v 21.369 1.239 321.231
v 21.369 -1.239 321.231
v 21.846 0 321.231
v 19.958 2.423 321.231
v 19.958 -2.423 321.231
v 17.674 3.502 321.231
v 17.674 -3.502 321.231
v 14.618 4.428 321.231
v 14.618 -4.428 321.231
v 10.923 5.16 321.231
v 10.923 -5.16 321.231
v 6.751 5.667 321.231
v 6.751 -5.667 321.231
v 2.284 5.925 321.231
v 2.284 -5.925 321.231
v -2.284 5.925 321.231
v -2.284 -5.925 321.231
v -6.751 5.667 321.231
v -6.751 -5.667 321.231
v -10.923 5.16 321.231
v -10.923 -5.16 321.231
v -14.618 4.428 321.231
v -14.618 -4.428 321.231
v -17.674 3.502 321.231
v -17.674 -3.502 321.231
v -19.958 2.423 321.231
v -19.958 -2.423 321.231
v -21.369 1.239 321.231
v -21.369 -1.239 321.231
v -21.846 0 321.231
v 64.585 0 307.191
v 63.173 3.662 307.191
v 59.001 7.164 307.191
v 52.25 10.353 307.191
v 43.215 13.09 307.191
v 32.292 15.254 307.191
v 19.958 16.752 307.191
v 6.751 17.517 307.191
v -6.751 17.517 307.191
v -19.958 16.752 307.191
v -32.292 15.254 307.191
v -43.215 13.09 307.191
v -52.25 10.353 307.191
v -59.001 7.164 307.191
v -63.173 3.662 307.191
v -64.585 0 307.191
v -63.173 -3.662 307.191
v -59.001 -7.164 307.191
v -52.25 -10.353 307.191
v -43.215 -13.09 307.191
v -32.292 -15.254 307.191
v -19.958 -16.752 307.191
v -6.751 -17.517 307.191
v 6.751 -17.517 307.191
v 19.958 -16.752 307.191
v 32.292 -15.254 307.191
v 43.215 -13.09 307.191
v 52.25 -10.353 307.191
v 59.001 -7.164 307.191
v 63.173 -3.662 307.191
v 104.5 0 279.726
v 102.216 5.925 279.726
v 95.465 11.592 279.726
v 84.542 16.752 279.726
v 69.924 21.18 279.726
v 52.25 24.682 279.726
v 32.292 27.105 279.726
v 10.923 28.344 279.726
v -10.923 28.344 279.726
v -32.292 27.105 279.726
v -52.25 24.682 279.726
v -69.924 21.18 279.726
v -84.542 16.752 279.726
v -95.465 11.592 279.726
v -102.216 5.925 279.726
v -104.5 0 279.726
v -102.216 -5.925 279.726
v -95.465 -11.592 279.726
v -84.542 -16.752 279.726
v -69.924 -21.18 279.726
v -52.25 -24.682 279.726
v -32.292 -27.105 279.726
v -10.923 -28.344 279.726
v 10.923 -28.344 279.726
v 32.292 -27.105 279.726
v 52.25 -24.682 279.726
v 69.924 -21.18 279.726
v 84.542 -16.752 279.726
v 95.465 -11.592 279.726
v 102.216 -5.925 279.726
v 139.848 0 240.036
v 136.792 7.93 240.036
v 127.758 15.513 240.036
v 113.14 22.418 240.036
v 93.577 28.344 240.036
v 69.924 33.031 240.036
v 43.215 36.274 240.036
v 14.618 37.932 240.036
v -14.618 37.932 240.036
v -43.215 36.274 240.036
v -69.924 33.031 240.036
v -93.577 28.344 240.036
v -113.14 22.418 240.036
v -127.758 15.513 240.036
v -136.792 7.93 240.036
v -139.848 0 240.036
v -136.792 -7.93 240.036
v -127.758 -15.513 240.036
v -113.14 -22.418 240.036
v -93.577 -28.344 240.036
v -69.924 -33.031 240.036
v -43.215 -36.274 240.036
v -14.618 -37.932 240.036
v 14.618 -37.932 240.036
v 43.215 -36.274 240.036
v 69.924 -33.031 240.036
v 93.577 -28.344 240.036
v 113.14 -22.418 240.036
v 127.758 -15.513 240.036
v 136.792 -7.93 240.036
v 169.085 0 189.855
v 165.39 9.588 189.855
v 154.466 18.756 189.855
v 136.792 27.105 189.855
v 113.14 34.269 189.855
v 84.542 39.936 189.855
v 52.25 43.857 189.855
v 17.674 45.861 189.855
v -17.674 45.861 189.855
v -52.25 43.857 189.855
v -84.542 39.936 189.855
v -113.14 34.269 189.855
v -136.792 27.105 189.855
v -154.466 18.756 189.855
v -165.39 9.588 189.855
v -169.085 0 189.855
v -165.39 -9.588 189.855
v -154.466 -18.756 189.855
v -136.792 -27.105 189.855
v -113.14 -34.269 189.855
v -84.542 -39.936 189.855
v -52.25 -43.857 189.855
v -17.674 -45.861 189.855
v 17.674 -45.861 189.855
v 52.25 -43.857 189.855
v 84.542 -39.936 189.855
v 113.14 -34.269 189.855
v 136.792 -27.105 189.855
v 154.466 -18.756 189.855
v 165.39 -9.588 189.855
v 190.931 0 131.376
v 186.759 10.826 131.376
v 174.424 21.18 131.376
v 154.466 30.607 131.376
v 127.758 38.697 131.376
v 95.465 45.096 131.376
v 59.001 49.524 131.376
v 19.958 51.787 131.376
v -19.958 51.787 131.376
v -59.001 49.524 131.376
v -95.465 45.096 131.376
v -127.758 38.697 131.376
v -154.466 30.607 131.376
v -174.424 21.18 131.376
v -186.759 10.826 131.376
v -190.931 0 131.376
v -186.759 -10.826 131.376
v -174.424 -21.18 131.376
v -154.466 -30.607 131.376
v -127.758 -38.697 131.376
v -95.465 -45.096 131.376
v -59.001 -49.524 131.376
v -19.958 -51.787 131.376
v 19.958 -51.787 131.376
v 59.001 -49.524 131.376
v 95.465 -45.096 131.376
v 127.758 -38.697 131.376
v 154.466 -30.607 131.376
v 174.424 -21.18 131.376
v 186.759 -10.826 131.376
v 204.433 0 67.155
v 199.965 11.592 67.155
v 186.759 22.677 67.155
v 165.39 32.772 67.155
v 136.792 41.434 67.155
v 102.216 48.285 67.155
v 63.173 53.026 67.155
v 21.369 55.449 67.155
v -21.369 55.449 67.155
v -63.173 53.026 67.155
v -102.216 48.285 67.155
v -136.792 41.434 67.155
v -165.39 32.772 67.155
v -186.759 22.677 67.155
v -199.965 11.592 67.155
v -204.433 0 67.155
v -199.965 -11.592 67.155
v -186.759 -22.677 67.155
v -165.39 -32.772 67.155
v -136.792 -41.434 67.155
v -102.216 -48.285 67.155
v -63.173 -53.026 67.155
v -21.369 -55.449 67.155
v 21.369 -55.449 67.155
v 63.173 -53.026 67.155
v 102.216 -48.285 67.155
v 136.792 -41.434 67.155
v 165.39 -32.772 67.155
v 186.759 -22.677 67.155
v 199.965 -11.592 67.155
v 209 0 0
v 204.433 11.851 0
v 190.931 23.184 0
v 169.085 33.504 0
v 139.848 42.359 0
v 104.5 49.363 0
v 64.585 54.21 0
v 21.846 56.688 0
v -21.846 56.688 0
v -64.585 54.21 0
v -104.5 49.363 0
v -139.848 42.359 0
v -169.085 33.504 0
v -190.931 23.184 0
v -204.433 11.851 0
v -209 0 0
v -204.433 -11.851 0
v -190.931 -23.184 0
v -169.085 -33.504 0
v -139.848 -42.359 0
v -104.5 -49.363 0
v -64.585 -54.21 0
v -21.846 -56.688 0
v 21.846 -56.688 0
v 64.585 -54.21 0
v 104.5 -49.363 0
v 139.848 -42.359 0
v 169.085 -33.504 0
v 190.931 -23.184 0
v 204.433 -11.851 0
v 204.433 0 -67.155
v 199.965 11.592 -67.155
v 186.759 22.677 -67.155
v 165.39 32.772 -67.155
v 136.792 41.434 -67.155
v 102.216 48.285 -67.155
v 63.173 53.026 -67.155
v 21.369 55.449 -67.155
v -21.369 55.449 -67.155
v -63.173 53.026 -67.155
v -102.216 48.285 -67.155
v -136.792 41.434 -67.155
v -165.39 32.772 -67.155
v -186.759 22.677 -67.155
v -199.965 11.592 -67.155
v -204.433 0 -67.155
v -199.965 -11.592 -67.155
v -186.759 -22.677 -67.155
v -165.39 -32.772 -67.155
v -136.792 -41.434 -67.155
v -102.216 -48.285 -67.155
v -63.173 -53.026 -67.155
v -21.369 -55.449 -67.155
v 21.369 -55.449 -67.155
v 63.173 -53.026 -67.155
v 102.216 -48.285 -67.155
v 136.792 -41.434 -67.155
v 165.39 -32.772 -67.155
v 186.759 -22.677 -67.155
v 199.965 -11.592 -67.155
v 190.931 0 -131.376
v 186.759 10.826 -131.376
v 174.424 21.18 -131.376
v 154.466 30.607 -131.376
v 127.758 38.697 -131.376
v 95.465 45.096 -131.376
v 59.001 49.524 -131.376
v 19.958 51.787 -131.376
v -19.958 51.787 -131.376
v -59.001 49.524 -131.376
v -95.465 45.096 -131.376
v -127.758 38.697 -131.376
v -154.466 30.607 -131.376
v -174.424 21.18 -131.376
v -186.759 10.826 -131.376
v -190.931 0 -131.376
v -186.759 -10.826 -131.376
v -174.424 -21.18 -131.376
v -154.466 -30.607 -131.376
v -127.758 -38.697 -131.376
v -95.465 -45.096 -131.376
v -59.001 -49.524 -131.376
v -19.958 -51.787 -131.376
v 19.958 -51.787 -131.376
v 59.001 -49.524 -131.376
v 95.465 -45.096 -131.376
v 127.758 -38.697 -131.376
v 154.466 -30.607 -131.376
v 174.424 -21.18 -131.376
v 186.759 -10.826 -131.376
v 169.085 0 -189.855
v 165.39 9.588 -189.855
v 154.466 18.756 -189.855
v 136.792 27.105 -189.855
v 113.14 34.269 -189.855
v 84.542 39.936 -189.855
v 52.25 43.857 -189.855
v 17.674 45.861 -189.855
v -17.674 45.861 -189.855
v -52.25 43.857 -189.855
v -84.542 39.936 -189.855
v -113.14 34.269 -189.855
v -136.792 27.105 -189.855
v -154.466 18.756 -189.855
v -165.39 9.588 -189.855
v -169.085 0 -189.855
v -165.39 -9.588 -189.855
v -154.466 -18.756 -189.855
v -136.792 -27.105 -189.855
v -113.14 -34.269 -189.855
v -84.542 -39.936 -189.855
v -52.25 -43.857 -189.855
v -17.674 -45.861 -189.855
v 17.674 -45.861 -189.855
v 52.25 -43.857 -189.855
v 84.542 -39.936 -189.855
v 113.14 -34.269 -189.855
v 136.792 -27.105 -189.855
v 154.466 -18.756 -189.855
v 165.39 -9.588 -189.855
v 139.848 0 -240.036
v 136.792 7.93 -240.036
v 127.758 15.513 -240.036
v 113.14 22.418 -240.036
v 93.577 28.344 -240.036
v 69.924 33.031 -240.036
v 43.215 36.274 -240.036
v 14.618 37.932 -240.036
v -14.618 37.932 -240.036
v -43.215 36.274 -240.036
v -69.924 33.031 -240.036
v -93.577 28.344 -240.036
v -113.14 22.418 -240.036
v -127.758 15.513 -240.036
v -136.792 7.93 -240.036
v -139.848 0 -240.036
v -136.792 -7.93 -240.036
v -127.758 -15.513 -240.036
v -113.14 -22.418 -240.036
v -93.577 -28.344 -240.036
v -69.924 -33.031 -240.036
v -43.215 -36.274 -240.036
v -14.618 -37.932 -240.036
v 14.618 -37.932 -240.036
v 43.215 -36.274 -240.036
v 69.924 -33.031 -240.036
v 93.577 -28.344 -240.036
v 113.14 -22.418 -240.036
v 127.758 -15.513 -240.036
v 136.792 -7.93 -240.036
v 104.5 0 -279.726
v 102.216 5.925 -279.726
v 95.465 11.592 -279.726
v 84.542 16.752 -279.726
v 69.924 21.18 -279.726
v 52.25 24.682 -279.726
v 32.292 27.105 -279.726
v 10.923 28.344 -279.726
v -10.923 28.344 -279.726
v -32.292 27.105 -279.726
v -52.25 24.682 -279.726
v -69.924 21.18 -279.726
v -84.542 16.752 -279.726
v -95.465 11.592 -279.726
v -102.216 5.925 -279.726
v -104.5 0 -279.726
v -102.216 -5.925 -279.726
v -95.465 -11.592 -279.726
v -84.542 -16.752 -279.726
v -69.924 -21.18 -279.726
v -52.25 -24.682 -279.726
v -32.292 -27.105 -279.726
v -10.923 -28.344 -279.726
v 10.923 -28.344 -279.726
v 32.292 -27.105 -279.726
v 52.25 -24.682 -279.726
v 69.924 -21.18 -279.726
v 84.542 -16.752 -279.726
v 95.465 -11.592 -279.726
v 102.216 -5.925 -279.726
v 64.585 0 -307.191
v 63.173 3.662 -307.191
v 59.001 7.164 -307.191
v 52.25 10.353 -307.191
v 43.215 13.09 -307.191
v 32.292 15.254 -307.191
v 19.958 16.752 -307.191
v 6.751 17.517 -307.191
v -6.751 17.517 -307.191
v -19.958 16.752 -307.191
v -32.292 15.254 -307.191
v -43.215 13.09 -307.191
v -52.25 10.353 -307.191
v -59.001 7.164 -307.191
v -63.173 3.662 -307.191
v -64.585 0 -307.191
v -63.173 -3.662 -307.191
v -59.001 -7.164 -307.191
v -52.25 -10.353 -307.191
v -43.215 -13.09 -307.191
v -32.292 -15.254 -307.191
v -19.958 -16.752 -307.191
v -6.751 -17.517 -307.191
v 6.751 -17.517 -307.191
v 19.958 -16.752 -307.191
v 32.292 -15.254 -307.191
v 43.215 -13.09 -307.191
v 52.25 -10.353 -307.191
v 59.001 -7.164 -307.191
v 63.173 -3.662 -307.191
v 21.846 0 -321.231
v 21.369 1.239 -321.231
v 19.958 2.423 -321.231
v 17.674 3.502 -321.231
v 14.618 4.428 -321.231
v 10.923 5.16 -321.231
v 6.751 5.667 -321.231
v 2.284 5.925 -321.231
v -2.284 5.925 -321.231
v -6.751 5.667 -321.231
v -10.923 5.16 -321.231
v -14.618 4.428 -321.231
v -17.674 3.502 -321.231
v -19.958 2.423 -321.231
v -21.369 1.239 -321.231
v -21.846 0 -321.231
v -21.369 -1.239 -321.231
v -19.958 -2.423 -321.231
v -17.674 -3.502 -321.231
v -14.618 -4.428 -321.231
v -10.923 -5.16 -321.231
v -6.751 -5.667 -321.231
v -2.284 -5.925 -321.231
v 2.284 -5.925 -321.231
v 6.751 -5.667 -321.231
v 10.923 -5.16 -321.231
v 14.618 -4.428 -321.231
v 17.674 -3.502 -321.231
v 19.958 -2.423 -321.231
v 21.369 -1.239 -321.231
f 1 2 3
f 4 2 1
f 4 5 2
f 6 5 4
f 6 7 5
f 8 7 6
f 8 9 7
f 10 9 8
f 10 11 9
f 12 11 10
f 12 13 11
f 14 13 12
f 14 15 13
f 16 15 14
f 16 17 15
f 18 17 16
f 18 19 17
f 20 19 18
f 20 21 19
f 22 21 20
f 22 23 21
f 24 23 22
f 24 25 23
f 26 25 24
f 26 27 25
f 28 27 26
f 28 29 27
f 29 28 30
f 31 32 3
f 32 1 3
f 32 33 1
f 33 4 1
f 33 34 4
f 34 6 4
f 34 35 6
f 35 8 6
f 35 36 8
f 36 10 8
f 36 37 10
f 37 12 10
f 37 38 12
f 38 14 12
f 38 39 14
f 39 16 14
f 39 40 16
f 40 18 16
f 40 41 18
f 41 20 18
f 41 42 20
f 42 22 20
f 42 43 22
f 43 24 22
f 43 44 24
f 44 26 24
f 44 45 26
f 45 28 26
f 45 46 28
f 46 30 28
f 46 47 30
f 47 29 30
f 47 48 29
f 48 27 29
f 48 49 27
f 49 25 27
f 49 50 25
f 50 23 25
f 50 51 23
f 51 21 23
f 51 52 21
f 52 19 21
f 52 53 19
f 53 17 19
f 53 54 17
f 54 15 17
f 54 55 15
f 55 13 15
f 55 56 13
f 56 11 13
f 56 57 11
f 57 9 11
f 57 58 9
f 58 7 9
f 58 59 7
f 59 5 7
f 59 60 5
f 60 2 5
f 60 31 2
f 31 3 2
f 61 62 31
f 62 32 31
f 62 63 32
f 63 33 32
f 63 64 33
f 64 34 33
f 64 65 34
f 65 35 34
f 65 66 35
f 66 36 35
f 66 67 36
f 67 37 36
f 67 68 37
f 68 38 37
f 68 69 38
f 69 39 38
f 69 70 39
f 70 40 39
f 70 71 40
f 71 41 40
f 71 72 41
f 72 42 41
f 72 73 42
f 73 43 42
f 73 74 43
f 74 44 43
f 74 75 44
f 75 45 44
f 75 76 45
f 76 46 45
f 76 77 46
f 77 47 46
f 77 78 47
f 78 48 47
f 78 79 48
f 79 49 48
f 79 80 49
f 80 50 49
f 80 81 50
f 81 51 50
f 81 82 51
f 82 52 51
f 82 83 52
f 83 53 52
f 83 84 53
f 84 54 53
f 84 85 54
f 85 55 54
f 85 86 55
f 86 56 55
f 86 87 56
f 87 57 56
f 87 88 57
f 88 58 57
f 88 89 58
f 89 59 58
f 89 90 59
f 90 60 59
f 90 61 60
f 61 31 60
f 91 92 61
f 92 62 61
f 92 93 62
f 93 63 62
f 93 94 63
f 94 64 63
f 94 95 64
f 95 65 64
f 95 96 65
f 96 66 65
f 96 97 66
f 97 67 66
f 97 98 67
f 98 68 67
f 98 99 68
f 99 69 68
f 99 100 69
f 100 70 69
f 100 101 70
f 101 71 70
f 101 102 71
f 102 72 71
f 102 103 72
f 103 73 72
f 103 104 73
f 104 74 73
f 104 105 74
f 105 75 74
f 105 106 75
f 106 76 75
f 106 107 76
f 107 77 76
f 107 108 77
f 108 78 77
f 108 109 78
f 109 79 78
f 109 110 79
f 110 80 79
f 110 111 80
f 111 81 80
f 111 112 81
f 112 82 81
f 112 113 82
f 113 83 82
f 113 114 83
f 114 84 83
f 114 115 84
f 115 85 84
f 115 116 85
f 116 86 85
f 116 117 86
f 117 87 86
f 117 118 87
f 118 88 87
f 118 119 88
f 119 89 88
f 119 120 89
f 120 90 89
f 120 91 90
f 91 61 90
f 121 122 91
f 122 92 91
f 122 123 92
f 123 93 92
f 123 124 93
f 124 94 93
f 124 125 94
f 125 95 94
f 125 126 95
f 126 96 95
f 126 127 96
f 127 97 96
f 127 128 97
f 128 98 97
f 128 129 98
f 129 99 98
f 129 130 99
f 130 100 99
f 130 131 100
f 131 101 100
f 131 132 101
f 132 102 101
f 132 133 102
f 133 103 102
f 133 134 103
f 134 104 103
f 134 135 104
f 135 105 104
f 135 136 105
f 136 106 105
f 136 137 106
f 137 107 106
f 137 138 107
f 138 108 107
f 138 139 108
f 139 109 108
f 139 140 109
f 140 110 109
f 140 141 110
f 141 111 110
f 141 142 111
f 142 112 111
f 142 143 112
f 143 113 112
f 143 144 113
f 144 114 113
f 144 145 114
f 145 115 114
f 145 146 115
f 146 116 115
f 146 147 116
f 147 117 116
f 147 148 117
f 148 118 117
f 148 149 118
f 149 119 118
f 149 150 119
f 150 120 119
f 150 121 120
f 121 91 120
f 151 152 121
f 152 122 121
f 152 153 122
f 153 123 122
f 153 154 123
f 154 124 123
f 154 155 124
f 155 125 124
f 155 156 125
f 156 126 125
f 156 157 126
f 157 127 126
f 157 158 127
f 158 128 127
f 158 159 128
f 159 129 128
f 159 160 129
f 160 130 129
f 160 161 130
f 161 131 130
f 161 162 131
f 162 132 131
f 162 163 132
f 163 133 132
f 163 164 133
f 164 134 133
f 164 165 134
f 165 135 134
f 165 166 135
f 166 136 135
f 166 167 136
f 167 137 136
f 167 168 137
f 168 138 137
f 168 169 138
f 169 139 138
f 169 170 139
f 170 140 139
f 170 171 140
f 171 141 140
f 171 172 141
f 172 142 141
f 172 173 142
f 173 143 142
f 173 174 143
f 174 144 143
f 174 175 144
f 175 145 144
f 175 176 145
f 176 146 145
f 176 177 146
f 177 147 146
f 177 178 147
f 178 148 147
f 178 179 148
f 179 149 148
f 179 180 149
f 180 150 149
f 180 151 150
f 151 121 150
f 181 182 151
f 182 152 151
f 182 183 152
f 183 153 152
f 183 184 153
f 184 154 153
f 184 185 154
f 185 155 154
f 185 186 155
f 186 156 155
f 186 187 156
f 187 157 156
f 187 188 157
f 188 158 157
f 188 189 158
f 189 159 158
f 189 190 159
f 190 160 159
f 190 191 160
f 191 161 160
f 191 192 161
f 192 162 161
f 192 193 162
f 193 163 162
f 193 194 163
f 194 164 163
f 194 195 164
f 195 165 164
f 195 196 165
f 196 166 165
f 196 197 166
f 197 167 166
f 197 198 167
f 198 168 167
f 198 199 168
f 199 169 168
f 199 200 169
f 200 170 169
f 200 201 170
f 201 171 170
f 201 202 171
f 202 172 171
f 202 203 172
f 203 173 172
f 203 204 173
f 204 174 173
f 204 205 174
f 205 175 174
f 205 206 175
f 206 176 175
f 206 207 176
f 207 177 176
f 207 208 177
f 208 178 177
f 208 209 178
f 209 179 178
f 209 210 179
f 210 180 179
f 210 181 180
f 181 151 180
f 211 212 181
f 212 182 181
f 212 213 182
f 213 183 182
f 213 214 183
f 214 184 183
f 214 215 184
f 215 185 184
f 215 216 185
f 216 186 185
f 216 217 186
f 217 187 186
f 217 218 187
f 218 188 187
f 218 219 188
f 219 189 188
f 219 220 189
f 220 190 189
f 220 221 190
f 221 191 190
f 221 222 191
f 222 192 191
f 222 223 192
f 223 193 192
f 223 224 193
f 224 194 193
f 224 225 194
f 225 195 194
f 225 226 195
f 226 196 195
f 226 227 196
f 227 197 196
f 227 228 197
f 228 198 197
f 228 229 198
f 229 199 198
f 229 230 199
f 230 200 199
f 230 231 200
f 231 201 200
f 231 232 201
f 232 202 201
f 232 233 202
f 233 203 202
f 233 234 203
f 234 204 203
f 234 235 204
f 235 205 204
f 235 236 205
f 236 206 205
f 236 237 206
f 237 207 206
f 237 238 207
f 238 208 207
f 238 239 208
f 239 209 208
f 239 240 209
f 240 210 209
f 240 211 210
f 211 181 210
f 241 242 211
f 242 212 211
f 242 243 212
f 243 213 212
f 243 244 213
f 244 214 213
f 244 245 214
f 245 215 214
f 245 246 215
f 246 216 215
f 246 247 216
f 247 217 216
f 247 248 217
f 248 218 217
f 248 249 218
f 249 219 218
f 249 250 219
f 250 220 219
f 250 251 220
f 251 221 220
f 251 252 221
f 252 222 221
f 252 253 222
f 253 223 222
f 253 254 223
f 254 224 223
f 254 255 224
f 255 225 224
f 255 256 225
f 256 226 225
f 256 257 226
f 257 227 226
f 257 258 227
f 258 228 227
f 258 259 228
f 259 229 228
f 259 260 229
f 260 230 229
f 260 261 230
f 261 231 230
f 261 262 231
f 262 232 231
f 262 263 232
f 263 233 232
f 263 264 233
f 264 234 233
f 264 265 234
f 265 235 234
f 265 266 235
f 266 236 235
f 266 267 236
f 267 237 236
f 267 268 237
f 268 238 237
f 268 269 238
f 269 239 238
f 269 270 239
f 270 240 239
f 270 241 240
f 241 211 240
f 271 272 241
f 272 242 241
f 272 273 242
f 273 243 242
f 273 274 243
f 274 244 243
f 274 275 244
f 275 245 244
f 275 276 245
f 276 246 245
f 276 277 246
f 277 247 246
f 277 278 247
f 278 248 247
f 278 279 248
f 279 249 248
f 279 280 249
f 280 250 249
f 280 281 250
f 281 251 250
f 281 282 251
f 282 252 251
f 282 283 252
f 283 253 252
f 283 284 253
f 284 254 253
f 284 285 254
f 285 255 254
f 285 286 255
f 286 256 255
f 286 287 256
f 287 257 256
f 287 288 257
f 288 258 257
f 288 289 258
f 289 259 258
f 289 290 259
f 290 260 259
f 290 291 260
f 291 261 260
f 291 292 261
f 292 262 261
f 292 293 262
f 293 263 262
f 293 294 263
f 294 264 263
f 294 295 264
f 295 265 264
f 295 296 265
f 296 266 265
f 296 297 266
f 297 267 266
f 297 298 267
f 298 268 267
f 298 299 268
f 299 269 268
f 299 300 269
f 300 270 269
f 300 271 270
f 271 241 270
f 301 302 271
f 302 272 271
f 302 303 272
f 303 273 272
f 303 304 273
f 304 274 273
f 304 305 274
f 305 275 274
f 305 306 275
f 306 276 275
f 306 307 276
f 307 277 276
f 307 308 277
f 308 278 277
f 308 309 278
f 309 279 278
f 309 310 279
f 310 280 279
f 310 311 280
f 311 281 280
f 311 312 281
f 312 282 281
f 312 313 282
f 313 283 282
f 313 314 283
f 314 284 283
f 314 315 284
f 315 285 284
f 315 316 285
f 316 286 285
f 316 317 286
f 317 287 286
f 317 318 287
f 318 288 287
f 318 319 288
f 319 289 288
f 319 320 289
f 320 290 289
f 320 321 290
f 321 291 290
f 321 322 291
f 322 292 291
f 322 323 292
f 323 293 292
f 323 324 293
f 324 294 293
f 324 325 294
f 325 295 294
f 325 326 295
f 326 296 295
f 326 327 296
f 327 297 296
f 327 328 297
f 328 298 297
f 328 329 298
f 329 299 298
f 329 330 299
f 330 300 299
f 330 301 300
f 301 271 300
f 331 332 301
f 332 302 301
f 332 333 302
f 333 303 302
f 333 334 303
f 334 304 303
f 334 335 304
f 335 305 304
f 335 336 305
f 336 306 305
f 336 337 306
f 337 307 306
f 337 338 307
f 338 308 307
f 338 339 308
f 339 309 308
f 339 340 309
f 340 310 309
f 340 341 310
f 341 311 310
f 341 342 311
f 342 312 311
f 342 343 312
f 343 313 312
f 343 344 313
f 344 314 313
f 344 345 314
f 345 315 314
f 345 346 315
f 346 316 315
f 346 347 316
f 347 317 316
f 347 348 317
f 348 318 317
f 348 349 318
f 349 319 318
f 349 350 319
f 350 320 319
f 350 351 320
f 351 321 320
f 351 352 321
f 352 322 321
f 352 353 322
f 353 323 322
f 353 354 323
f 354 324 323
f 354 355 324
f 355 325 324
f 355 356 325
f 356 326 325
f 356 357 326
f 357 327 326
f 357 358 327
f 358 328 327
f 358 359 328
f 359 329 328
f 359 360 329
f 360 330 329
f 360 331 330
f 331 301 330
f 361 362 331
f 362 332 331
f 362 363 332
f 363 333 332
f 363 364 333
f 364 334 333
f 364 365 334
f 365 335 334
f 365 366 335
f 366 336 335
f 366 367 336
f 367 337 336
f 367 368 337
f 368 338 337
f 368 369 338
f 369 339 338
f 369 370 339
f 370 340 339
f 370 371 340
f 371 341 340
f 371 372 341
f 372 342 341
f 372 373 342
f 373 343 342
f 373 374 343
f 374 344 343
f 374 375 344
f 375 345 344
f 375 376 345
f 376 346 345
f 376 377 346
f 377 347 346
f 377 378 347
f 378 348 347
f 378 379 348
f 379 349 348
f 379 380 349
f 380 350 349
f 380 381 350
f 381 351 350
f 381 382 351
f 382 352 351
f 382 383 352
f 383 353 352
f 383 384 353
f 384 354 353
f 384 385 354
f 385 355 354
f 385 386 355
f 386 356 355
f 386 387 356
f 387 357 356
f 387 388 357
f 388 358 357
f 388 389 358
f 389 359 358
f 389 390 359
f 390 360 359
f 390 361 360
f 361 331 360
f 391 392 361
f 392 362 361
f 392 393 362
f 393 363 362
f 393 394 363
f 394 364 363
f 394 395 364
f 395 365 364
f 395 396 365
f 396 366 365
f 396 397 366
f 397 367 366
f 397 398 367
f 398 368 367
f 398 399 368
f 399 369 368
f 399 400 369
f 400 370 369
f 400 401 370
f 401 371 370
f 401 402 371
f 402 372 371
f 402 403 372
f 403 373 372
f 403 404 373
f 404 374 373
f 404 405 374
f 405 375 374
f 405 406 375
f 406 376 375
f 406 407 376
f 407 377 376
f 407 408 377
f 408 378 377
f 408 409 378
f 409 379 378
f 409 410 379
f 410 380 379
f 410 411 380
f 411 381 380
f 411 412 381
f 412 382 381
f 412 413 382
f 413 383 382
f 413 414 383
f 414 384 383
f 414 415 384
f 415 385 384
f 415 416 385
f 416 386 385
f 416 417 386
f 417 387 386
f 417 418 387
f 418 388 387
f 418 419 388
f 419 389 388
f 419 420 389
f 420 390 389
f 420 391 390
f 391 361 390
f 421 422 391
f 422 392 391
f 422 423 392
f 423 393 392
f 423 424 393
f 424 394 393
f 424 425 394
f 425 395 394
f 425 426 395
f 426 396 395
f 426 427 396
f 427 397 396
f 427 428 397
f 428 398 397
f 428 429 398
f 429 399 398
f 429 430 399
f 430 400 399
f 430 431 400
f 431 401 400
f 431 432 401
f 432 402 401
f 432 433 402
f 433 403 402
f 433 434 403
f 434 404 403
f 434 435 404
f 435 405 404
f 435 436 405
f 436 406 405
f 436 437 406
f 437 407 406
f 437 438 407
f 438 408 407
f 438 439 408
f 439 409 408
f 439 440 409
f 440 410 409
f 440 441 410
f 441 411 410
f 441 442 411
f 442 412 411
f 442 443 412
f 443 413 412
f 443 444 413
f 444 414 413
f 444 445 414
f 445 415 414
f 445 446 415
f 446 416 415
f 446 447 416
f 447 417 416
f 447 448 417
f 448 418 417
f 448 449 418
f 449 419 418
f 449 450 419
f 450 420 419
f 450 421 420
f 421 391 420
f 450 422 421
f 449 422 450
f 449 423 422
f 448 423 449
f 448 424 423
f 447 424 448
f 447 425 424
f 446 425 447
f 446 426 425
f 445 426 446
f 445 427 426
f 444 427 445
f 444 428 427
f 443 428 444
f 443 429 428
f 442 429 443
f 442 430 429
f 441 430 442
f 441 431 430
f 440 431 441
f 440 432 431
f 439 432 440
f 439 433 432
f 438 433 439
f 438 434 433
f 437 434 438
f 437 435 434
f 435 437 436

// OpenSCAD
// Generated by SolidPython 1.0.1 on 2020-07-29 00:46:49


scale(v = [11, 3, 17]) {
	sphere(r = 19);
}
/***********************************************
*********      SolidPython code:      **********
************************************************
 
# import packages: SolidPython
from solid import *
from solid.utils import *
from itertools import chain, combinations, permutations


class Resize:

    def __init__(self, scad_file):
        self.scad_file = scad_file
        #self.scad_file = import_scad(scad_file)
        # cone/cylinder param:
        self.r1 = 0
        self.r2 = 0
        self.h = 0
        # rectangular prism param:
        self.w = 0
        self.l = 0
        # ellipse param:
        self.r = 0

    # import OpenScad code (file name corresponds to shape)


    # classify shape + parameters
    def assign(self, param1, param2, param3):
        if self.scad_file == 'cone.scad':
            self.r1 = param1
            self.r2 = param2
            self.h = param3
        elif self.scad_file == 'cylinder.scad':
            self.r1 = param1
            self.r2 = param2
            self.h = param3
        elif self.scad_file == 'rectangularPrism.scad':
            self.h = param1
            self.l = param2
            self.w = param3
        else:
            self.r = param1
            self.h = param2

    # resize parameters
    def iterate(self):
        x = range(3, 20, 2)
        i = 1
        if self.scad_file == 'cone.scad':
            tempList = list(permutations(x, 2))
            for temp in tempList:
                param1 = temp[0]
                param2 = temp[1]
                filepath = 'produced_scad_files/' + 'cone' + str(param1) + '_' + str(param2) + '_' + '.scad'
                scad_render_to_file(cylinder(h=param1, r1=param2, r2=0), filepath)

        elif self.scad_file == 'cylinder.scad':
            tempList = list(permutations(x, 3))
            for temp in tempList:
                param1 = temp[0]
                param2 = temp[1]
                filepath = 'produced_scad_files/' + 'cylinder' + str(param1) + '_' + str(param2) + '_' + '.scad'
                scad_render_to_file(cylinder(h=param1, r1=param2, r2=param2), filepath)

        elif self.scad_file == 'rectangularPrism.scad':
            tempList = list(permutations(x, 3))
            for temp in tempList:
                param1 = temp[0]
                param2 = temp[1]
                param3 = temp[2]
                filepath = 'produced_scad_files/' + 'rectangularPrism' + str(param1) + '_' + str(param2) + '_' + str(
                    param3) + '.scad'
                scad_render_to_file(cube(size=(param1, param2, param3)), filepath)

        elif self.scad_file == 'ellipse.scad':
            tempList = list(permutations(x, 4))
            for temp in tempList:
                param1 = temp[0]
                param2 = temp[1]
                param3 = temp[2]
                param4 = temp[3]
                filepath = 'produced_scad_files/' + 'ellipse' + str(param1) + '_' + str(param2) + '_' + str(param3) + '_' + str(param4) + '.scad'
                scad_render_to_file(scale([param1, param2, param3])(sphere(r=param4)), filepath)

    def render_to_scadfile(self):
        scad_render_to_file(scad, 'example.scad') 
 
************************************************/
